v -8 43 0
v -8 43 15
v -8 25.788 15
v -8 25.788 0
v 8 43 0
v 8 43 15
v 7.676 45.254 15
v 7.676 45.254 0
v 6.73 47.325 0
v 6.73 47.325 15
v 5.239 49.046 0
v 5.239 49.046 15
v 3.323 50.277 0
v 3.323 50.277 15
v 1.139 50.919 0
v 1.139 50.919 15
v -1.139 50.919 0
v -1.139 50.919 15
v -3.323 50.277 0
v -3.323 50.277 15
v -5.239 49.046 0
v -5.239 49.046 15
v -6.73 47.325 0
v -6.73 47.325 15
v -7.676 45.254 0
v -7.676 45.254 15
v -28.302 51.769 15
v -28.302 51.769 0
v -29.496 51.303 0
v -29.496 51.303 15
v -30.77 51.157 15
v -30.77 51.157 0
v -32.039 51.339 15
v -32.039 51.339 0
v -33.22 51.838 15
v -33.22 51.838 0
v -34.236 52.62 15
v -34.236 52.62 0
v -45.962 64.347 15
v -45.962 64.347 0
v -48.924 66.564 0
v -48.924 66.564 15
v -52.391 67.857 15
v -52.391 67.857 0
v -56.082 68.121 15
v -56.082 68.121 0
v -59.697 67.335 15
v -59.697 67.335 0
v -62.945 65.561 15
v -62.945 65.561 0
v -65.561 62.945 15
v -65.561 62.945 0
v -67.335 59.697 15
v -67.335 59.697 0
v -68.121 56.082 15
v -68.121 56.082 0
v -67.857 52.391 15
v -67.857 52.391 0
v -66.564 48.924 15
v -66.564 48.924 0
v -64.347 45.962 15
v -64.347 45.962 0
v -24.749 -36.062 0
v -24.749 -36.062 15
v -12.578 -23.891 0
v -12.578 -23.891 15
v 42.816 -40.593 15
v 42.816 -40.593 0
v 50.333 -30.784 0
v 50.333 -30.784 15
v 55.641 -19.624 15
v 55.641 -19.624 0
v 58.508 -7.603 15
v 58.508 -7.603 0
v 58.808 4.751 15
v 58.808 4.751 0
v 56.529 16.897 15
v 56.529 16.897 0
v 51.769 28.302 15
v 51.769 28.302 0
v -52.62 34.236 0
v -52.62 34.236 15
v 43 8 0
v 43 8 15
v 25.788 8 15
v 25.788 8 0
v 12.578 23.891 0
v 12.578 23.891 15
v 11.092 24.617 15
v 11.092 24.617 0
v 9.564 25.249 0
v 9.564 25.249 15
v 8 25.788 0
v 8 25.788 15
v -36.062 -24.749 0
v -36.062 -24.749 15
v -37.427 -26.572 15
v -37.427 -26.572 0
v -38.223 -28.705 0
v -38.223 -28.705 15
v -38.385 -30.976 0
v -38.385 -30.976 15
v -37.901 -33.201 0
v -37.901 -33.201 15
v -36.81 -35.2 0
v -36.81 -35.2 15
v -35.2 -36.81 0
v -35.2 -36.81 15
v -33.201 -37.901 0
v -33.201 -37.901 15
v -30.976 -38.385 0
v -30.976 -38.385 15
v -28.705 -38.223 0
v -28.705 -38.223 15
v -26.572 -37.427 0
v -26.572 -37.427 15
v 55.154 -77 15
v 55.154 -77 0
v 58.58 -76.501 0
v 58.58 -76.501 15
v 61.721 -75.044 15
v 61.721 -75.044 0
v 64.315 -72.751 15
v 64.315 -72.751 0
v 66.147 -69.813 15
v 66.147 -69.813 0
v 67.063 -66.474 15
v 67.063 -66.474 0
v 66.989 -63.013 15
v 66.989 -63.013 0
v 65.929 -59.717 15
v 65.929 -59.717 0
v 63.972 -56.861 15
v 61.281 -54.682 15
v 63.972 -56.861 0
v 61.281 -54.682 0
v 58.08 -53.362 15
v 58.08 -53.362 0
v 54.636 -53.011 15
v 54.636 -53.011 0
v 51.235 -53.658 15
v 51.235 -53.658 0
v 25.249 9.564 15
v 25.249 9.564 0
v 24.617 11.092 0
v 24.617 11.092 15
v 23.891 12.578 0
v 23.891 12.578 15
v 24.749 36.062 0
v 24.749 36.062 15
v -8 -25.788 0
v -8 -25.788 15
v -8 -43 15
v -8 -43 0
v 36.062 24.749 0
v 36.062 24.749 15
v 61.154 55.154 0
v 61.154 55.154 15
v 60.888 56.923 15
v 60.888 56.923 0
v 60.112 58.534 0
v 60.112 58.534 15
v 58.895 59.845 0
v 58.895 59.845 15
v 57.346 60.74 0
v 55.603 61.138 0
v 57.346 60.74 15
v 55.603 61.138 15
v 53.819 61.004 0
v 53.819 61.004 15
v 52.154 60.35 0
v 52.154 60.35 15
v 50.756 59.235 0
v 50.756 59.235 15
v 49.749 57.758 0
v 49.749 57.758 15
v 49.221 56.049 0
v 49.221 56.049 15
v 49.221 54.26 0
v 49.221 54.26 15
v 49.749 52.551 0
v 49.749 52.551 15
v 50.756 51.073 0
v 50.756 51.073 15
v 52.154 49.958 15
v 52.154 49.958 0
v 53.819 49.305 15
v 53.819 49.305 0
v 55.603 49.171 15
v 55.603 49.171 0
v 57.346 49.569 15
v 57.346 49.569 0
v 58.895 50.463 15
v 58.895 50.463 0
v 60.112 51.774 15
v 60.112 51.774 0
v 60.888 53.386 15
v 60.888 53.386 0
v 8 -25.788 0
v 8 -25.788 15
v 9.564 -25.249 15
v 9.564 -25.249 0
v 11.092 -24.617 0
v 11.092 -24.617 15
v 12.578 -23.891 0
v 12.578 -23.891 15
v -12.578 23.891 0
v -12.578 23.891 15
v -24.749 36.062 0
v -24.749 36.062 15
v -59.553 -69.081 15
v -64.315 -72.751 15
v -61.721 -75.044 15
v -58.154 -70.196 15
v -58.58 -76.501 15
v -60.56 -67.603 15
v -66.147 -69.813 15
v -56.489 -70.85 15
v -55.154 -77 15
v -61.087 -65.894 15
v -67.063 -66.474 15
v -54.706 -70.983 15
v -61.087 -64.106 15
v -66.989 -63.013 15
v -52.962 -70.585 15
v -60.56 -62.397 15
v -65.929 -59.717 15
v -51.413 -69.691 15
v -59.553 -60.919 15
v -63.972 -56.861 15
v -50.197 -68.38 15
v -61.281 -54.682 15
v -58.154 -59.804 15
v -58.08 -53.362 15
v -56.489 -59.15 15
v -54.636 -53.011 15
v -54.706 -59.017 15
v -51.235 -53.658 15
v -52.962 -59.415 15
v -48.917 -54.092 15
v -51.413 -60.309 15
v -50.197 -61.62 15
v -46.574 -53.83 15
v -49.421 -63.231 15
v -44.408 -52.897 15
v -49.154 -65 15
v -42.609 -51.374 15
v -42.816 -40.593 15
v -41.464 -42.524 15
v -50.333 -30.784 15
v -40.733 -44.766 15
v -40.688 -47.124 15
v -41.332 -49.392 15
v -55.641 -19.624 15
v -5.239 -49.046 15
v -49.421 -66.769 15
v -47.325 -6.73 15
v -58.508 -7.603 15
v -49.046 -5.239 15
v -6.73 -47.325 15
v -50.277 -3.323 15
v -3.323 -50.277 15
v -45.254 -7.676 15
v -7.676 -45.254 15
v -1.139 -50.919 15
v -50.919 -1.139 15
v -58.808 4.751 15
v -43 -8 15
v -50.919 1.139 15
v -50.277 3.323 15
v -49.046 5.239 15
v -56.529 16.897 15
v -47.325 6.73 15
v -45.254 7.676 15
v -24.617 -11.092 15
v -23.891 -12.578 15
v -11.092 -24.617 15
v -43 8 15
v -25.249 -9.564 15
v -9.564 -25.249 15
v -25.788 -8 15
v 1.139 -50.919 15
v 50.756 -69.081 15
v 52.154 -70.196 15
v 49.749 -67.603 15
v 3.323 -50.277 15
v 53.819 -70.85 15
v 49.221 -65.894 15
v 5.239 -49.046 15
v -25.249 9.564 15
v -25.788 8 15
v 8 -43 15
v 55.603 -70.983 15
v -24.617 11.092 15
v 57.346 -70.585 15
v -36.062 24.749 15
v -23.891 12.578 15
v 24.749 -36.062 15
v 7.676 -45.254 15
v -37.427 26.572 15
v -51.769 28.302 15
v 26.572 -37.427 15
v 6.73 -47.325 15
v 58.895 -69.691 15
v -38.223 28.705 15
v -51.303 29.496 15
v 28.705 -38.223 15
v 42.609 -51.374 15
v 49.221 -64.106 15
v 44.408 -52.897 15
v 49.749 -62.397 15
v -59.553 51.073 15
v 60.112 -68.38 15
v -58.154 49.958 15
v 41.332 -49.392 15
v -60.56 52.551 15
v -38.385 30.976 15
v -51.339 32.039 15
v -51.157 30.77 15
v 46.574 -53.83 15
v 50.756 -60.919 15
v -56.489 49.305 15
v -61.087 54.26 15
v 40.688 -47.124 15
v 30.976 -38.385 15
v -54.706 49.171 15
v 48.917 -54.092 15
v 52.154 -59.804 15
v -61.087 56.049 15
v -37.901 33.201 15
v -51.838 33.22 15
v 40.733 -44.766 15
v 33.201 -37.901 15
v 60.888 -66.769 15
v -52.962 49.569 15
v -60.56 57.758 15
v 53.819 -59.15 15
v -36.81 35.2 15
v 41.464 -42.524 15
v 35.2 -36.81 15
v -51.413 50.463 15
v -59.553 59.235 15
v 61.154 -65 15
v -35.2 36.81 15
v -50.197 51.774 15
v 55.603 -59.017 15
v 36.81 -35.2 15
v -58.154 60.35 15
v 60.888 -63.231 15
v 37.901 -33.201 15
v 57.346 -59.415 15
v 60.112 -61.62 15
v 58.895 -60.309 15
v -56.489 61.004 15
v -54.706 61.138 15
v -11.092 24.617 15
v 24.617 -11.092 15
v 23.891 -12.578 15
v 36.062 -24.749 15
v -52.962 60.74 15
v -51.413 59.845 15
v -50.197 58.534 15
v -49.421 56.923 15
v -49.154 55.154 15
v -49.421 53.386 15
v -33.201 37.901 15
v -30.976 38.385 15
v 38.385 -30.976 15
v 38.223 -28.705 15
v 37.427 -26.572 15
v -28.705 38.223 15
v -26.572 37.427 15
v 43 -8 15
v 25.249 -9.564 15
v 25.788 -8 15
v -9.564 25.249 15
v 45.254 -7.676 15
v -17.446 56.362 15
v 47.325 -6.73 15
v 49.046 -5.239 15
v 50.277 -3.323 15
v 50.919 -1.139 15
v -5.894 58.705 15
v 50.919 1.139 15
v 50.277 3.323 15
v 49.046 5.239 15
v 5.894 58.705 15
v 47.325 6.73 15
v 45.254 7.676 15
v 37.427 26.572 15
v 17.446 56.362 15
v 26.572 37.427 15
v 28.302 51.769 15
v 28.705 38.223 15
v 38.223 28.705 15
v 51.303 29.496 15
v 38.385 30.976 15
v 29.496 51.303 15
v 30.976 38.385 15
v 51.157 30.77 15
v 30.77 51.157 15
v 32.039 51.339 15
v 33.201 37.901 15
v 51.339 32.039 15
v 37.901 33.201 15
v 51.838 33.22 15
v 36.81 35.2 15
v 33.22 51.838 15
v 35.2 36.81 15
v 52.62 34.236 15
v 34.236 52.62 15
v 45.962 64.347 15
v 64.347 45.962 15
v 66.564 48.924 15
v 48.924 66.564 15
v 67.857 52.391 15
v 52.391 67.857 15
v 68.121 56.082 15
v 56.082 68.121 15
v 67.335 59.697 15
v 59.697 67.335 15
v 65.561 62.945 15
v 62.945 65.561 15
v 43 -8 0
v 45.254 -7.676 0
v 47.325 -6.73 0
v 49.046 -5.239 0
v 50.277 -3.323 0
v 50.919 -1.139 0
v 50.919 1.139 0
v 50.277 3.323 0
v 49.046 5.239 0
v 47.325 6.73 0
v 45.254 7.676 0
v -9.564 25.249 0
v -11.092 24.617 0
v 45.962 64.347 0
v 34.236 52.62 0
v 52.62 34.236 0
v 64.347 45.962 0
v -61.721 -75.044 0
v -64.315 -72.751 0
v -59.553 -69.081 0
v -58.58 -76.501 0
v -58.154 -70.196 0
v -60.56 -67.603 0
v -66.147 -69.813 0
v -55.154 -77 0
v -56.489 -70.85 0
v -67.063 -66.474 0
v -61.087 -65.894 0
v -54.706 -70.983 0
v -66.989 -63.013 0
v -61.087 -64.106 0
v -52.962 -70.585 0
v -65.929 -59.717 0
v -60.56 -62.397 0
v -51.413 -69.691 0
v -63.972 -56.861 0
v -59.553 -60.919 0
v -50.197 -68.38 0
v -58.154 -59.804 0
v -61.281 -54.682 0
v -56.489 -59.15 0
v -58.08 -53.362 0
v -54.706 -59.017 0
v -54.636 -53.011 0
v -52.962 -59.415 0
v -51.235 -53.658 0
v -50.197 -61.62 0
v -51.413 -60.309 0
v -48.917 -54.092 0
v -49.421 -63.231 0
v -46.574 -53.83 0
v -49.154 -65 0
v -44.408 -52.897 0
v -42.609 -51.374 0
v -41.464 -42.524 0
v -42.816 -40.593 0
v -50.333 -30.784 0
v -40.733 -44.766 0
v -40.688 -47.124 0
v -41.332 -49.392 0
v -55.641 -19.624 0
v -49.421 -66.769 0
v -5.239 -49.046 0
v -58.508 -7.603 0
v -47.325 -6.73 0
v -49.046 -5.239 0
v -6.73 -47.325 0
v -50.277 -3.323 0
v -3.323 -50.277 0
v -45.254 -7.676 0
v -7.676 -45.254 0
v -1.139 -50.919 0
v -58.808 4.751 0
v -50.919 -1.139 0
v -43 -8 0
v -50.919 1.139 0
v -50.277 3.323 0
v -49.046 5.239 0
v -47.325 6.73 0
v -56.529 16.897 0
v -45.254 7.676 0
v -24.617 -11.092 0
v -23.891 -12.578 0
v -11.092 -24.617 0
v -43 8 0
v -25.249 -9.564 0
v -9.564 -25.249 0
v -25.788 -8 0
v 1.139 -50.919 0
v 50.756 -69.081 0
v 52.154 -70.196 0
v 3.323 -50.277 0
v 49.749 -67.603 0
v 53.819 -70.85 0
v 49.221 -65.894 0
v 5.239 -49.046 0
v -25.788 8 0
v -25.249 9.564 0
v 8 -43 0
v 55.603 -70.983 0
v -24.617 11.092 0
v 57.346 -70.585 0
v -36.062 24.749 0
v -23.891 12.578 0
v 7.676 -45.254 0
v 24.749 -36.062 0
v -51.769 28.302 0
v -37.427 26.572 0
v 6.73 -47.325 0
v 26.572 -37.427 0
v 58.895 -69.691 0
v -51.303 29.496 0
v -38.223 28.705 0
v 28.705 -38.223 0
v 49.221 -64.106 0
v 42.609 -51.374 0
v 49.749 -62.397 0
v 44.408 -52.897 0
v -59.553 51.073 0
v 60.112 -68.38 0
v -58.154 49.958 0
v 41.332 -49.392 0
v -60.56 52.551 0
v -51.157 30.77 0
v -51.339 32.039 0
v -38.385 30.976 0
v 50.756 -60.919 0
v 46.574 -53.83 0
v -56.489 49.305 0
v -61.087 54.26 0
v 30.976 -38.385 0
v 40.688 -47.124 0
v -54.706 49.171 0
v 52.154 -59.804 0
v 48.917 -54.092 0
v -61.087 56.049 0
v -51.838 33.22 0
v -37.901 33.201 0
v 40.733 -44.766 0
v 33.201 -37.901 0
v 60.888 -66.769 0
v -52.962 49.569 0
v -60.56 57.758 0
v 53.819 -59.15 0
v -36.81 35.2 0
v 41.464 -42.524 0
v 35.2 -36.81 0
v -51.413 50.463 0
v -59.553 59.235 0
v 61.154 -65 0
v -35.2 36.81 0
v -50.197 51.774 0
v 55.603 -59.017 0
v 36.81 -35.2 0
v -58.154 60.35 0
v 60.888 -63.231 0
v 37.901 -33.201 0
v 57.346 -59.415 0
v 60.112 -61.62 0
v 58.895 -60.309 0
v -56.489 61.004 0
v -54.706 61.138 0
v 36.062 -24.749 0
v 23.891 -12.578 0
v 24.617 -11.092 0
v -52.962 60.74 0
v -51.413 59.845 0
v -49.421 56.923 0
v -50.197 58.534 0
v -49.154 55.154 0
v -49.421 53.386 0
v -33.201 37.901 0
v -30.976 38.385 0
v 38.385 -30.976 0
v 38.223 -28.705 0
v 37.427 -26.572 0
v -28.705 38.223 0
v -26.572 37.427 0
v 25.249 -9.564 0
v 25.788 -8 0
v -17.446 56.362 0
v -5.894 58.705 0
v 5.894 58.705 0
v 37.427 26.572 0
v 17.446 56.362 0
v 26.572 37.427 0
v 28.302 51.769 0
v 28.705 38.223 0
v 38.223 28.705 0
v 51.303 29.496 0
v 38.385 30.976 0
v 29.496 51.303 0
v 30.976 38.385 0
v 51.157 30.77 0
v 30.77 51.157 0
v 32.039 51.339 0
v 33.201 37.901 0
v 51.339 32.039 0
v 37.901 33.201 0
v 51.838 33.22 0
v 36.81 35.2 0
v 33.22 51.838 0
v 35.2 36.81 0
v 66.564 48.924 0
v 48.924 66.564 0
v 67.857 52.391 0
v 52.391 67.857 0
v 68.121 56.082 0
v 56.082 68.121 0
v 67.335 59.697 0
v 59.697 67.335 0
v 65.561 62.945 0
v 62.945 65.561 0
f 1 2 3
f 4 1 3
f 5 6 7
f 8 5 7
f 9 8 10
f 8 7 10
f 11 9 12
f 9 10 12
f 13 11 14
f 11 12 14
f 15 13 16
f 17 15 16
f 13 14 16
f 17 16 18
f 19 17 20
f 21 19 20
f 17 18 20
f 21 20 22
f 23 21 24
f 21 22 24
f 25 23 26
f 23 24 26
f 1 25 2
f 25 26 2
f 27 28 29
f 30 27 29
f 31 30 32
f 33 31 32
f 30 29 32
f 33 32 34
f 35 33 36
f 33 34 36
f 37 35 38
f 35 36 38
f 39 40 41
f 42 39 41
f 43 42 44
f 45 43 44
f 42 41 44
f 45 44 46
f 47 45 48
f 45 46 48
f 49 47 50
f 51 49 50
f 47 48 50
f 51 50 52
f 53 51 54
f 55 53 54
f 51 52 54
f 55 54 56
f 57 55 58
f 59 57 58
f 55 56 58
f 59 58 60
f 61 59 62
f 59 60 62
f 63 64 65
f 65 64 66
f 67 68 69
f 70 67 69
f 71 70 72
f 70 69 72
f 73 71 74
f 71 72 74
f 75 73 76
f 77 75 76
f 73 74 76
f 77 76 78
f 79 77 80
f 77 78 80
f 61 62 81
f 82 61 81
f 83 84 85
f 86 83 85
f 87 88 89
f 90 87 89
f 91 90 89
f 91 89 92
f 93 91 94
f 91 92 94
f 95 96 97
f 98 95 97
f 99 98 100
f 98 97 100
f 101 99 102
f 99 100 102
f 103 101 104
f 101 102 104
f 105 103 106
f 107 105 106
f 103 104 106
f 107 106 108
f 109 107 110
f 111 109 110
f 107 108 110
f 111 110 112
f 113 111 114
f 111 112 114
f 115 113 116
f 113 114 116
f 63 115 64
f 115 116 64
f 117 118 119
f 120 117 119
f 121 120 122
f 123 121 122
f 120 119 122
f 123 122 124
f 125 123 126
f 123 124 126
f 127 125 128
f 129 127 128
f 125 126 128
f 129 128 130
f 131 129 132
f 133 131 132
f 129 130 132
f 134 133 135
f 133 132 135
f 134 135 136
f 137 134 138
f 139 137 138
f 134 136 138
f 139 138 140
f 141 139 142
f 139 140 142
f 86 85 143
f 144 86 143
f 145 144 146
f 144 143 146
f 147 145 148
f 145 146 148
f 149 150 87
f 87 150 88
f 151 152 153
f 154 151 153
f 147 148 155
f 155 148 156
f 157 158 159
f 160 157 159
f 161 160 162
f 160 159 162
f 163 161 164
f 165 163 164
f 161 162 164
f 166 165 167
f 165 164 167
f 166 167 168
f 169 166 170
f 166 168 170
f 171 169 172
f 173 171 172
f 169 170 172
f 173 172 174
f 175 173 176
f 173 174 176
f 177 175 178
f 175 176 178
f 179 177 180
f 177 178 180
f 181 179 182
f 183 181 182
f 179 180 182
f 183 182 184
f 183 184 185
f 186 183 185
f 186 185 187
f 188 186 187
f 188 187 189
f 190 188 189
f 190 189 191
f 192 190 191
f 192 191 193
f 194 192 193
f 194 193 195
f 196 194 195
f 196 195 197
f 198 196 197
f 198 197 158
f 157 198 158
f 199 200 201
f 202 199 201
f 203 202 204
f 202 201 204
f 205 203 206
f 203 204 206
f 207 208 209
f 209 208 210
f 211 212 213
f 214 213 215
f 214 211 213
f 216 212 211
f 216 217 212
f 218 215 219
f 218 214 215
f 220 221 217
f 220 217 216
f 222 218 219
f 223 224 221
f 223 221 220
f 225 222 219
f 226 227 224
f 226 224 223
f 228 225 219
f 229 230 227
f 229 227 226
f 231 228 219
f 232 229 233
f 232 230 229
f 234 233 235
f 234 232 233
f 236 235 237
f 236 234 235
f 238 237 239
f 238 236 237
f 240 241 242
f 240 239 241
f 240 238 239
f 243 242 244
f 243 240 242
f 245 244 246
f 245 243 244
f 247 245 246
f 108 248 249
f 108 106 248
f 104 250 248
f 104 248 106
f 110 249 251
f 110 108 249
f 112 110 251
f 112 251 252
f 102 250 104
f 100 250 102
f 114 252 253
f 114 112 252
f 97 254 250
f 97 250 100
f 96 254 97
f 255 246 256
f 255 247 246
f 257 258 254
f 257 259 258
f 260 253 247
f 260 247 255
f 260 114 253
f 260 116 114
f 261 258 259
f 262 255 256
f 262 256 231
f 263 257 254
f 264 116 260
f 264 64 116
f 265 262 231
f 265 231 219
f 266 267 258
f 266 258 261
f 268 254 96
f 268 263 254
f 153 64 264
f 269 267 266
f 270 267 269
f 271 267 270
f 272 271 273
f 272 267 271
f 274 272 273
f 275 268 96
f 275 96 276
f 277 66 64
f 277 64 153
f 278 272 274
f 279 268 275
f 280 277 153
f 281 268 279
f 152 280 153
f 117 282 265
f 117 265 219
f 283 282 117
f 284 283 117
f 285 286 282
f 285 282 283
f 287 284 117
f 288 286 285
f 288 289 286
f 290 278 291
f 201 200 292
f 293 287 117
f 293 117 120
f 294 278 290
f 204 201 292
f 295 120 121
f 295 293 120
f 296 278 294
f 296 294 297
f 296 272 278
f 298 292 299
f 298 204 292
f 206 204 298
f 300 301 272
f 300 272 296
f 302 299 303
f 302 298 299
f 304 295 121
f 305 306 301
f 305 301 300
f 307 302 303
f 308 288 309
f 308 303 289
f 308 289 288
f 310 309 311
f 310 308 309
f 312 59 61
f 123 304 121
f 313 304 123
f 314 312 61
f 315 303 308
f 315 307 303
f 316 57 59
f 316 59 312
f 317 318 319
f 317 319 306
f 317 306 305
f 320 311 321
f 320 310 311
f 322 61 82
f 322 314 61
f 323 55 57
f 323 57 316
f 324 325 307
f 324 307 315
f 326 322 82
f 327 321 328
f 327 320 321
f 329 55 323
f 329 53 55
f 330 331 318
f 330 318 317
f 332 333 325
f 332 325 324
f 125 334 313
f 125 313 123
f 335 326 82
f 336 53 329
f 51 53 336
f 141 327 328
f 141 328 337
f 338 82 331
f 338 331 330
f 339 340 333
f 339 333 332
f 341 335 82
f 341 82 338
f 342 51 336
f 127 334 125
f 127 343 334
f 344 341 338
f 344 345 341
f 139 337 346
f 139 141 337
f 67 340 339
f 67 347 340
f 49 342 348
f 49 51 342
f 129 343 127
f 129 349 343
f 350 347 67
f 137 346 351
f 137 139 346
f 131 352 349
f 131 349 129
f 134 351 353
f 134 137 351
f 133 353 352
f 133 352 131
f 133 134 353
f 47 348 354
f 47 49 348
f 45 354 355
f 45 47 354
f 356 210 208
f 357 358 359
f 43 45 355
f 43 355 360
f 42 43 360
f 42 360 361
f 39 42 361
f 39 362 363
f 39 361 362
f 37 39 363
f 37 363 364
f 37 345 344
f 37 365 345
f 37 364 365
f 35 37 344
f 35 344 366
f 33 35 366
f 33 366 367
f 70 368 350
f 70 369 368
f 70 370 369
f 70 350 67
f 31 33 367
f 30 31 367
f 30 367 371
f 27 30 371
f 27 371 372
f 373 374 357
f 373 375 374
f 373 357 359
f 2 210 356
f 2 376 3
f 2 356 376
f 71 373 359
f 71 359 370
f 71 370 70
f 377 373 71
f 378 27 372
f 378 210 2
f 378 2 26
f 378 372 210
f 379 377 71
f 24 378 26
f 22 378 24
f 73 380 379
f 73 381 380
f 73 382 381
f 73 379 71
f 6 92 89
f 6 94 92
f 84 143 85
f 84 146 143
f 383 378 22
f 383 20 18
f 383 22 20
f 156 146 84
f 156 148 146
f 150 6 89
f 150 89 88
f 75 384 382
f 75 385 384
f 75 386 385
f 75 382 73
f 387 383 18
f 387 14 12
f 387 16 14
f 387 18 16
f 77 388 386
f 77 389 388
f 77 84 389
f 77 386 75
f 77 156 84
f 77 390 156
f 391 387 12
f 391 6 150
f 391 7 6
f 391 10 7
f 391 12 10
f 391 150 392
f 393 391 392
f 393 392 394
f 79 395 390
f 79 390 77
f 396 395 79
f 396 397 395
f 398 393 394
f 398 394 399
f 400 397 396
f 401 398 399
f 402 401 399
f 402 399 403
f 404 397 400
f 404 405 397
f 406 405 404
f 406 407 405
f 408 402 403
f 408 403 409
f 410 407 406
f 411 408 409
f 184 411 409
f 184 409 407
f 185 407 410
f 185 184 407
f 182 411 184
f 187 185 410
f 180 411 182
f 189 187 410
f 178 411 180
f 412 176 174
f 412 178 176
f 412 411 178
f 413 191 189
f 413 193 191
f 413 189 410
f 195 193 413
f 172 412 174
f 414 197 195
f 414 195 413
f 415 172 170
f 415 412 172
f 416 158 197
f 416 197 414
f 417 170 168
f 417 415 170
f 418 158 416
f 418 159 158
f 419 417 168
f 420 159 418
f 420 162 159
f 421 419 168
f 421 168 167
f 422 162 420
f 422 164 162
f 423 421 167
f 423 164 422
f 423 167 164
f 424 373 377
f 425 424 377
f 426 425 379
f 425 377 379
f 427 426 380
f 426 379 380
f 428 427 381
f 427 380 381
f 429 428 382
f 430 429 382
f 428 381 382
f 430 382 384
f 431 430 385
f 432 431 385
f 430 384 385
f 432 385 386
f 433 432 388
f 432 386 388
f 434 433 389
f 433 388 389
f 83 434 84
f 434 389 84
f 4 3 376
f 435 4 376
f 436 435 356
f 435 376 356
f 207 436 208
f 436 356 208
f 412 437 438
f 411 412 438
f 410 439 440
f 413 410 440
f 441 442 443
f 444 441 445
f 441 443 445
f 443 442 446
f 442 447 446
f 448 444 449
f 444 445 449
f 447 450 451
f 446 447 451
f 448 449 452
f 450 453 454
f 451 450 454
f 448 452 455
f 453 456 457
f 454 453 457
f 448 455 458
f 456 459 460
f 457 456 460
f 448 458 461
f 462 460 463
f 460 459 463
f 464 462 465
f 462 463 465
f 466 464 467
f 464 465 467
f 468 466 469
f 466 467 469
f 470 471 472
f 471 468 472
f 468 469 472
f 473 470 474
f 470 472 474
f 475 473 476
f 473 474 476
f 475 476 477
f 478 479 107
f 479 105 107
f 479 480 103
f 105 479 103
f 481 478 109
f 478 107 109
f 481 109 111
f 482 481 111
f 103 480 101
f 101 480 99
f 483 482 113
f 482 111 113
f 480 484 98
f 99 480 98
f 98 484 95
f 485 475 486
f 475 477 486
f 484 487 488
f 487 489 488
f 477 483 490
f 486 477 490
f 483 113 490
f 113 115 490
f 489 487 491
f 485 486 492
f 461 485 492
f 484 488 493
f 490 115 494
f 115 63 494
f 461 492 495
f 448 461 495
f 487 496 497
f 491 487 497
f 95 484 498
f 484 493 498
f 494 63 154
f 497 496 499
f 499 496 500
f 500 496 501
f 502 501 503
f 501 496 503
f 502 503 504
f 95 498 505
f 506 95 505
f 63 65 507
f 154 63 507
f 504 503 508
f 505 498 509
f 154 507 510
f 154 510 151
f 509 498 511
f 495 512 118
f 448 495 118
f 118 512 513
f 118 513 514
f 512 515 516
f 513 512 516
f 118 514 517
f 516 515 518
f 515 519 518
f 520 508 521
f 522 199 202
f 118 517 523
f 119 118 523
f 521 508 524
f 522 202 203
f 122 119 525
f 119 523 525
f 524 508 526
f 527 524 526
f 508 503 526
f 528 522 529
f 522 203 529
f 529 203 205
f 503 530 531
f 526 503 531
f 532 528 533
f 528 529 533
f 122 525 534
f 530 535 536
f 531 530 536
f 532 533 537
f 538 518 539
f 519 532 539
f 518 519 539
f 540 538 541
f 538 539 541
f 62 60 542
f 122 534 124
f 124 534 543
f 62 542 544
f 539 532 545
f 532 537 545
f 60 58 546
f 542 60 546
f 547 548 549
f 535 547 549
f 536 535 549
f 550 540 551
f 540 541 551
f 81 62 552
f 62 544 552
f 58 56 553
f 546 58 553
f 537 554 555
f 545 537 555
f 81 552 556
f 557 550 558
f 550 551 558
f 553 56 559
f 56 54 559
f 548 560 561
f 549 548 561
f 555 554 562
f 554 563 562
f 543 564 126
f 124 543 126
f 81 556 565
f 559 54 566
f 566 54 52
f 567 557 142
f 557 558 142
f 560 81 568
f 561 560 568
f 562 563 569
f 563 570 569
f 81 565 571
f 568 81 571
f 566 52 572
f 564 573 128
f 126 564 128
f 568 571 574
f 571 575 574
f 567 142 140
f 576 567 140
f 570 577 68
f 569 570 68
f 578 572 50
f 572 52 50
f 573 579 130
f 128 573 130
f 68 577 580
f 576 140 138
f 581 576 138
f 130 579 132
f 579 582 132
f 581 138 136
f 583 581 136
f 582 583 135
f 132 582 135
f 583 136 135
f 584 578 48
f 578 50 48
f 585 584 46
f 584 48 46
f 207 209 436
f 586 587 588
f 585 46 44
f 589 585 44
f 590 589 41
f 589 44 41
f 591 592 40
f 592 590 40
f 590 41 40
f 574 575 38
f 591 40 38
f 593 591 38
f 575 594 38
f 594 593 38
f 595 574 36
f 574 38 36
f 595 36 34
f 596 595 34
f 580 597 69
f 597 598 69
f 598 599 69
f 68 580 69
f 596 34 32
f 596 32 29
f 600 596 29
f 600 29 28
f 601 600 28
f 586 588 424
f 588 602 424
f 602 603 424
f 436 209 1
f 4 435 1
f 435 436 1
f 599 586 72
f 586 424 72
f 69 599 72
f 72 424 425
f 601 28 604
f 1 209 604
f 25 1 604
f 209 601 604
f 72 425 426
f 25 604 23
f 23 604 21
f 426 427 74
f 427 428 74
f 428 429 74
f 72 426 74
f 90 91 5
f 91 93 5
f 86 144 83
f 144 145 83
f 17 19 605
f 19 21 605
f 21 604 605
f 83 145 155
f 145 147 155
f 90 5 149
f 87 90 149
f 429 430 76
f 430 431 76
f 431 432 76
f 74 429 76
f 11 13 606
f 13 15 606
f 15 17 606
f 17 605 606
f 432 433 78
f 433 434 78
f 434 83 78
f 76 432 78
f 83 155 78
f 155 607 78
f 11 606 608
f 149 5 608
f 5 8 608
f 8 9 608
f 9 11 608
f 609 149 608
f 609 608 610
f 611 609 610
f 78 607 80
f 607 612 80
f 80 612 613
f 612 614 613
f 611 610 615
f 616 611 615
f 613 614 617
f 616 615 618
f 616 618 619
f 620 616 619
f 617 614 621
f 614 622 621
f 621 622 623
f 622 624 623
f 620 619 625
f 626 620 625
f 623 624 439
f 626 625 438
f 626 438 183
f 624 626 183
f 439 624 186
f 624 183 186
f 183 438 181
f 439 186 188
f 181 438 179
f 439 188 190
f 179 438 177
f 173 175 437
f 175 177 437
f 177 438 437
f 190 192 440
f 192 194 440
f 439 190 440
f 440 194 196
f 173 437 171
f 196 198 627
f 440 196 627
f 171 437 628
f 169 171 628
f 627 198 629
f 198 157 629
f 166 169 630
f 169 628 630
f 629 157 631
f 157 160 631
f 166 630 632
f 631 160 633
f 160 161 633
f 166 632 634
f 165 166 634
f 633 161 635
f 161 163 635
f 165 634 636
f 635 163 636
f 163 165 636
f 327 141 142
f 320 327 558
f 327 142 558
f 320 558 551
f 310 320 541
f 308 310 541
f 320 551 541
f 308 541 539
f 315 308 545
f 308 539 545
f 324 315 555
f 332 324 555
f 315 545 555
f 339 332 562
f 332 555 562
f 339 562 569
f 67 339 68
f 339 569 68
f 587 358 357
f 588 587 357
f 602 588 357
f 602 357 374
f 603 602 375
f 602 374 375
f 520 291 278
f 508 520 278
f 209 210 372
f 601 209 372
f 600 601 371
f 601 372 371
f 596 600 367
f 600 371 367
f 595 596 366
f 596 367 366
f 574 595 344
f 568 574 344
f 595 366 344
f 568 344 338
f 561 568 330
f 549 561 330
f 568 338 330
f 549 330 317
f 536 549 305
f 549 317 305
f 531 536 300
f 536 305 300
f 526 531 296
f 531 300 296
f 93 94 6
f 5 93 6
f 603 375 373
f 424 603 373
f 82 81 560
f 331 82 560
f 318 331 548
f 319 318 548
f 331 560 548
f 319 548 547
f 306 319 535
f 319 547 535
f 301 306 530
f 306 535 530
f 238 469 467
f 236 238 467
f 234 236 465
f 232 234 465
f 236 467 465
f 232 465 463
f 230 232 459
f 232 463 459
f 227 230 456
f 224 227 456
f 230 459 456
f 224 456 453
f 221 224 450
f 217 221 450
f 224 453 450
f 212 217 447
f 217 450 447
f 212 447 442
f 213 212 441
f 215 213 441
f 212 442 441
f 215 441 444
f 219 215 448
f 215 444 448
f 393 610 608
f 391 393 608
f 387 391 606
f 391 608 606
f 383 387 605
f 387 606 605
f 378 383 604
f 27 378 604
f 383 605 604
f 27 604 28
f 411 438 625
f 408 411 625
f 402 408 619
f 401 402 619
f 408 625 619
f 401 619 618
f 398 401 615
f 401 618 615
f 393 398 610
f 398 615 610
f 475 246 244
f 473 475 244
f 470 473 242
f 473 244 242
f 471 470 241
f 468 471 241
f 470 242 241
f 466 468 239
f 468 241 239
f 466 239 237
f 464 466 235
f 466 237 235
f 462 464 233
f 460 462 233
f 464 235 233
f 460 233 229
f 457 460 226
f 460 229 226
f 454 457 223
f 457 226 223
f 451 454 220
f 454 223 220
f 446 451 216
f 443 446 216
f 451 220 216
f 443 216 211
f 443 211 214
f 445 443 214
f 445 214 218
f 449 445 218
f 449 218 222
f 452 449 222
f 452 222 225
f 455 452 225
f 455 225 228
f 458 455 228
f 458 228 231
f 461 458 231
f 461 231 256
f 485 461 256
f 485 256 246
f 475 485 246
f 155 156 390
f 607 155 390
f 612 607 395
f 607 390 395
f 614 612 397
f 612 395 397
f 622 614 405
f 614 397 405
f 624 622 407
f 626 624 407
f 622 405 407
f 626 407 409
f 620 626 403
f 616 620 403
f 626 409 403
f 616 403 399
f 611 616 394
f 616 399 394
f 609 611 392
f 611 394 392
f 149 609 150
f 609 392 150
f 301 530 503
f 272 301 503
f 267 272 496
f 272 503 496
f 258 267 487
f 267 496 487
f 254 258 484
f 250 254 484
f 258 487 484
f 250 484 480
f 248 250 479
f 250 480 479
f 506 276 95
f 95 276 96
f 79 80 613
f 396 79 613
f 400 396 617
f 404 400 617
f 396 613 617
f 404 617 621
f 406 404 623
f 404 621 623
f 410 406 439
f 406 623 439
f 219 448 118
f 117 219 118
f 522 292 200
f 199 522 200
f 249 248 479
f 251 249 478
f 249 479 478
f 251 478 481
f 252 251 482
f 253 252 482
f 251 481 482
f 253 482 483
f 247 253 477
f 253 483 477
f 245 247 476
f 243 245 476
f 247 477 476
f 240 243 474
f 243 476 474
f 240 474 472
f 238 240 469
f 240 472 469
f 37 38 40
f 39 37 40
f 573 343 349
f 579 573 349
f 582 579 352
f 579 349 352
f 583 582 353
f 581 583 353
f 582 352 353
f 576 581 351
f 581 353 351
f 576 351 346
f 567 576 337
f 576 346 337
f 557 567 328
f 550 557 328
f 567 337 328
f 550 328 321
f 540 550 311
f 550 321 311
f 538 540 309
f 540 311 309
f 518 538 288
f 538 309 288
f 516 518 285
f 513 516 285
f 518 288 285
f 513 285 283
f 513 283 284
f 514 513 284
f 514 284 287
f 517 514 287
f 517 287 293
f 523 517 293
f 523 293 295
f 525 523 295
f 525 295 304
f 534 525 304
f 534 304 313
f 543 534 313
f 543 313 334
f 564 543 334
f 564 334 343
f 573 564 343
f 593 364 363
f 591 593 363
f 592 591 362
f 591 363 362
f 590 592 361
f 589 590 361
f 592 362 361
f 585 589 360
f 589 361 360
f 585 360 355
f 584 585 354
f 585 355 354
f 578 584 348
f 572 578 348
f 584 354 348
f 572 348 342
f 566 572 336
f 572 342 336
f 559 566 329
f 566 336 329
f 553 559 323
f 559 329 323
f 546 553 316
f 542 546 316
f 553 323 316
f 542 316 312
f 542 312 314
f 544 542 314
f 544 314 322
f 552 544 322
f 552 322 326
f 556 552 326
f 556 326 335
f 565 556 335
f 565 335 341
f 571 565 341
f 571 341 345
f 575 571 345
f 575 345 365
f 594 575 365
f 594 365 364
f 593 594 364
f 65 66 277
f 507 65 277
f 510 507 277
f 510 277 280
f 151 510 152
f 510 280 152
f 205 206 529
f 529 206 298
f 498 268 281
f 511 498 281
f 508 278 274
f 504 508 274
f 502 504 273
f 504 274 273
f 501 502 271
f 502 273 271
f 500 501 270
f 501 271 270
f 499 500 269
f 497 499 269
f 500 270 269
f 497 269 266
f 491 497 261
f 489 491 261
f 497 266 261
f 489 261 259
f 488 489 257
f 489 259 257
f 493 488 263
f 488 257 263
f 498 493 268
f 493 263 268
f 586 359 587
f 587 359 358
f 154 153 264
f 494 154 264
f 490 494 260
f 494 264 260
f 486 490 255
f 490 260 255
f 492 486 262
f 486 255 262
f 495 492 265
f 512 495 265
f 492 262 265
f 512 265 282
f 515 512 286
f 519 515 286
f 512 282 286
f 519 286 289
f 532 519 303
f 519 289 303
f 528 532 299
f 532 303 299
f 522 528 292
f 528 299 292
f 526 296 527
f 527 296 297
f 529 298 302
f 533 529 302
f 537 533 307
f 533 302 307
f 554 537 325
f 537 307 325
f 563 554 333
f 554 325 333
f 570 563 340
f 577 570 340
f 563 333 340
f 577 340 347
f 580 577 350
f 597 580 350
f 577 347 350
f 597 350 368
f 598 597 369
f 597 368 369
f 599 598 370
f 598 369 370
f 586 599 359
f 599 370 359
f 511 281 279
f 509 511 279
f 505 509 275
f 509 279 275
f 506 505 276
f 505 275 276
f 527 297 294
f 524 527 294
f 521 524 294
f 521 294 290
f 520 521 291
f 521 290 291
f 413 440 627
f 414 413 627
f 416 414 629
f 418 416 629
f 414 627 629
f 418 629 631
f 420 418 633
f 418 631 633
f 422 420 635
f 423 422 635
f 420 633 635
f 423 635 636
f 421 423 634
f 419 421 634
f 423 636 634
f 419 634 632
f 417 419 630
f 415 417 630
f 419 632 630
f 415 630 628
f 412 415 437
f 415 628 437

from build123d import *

# Parameters (mm, degrees)
SALIENTE_EXTRUIR1_DEPTH = 15
CROQUIS2_R              = 6
CORTAR_EXTRUIR1_DEPTH   = 104.918297485


with BuildPart() as part:
    # Croquis1 → Saliente-Extruir1 (new body)
    with BuildSketch(Plane.XY):
        with BuildLine():
            Line((-64.346717088, 45.961940777), (-52.620489657, 34.235713346))
            ThreePointArc((-52.620489657, 34.235713346), (-51.206737587, 31.410509176), (-51.768834222, 28.301727921))
            ThreePointArc((-51.768834222, 28.301727921), (-58.508070764, -7.603003058), (-42.816126208, -40.592848343))
            ThreePointArc((-42.816126208, -40.592848343), (-41.896840908, -50.430118648), (-51.234753159, -53.658178023))
            ThreePointArc((-51.234753159, -53.658178023), (-66.988640567, -63.012773757), (-55.154328933, -77))
            Line((-55.154328933, -77), (55.154328933, -77))
            ThreePointArc((55.154328933, -77), (66.988640567, -63.012773757), (51.234753159, -53.658178023))
            ThreePointArc((51.234753159, -53.658178023), (41.896840908, -50.430118648), (42.816126208, -40.592848343))
            ThreePointArc((42.816126208, -40.592848343), (58.508070764, -7.603003058), (51.768834222, 28.301727921))
            ThreePointArc((51.768834222, 28.301727921), (51.206737587, 31.410509176), (52.620489657, 34.235713346))
            Line((52.620489657, 34.235713346), (64.346717088, 45.961940777))
            ThreePointArc((64.346717088, 45.961940777), (64.346717088, 64.346717088), (45.961940777, 64.346717088))
            Line((45.961940777, 64.346717088), (34.235713346, 52.620489657))
            ThreePointArc((34.235713346, 52.620489657), (31.410509176, 51.206737587), (28.301727921, 51.768834222))
            ThreePointArc((28.301727921, 51.768834222), (0, 59), (-28.301727921, 51.768834222))
            ThreePointArc((-28.301727921, 51.768834222), (-31.410509176, 51.206737587), (-34.235713346, 52.620489657))
            Line((-34.235713346, 52.620489657), (-45.961940777, 64.346717088))
            ThreePointArc((-45.961940777, 64.346717088), (-64.346717088, 64.346717088), (-64.346717088, 45.961940777))
        make_face()
    extrude(amount=SALIENTE_EXTRUIR1_DEPTH)

    # Croquis2 → Cortar-Extruir1 (cut, through all)
    with BuildSketch(Plane.XY.offset(15)):
        with Locations((-55.154328933, 55.154328933)):
            Circle(CROQUIS2_R)
        with Locations((55.154328933, 55.154328933)):
            Circle(CROQUIS2_R)
        with Locations((-55.154328933, -65)):
            Circle(CROQUIS2_R)
        with Locations((55.154328933, -65)):
            Circle(CROQUIS2_R)
        with BuildLine():
            Line((-8, 43), (-8, 25.787593916))
            ThreePointArc((-8, 25.787593916), (-10.332452674, 24.944747378), (-12.577728279, 23.891436778))
            Line((-12.577728279, 23.891436778), (-24.748737342, 36.062445841))
            ThreePointArc((-24.748737342, 36.062445841), (-36.062445841, 36.062445841), (-36.062445841, 24.748737342))
            Line((-36.062445841, 24.748737342), (-23.891436778, 12.577728279))
            ThreePointArc((-23.891436778, 12.577728279), (-24.944747378, 10.332452674), (-25.787593916, 8))
            Line((-25.787593916, 8), (-43, 8))
            ThreePointArc((-43, 8), (-51, 0), (-43, -8))
            Line((-43, -8), (-25.787593916, -8))
            ThreePointArc((-25.787593916, -8), (-24.944747378, -10.332452674), (-23.891436778, -12.577728279))
            Line((-23.891436778, -12.577728279), (-36.062445841, -24.748737342))
            ThreePointArc((-36.062445841, -24.748737342), (-36.062445841, -36.062445841), (-24.748737342, -36.062445841))
            Line((-24.748737342, -36.062445841), (-12.577728279, -23.891436778))
            ThreePointArc((-12.577728279, -23.891436778), (-10.332452674, -24.944747378), (-8, -25.787593916))
            Line((-8, -25.787593916), (-8, -43))
            ThreePointArc((-8, -43), (0, -51), (8, -43))
            Line((8, -43), (8, -25.787593916))
            ThreePointArc((8, -25.787593916), (10.332452674, -24.944747378), (12.577728279, -23.891436778))
            Line((12.577728279, -23.891436778), (24.748737342, -36.062445841))
            ThreePointArc((24.748737342, -36.062445841), (36.062445841, -36.062445841), (36.062445841, -24.748737342))
            Line((36.062445841, -24.748737342), (23.891436778, -12.577728279))
            ThreePointArc((23.891436778, -12.577728279), (24.944747378, -10.332452674), (25.787593916, -8))
            Line((25.787593916, -8), (43, -8))
            ThreePointArc((43, -8), (51, 0), (43, 8))
            Line((43, 8), (25.787593916, 8))
            ThreePointArc((25.787593916, 8), (24.944747378, 10.332452674), (23.891436778, 12.577728279))
            Line((23.891436778, 12.577728279), (36.062445841, 24.748737342))
            ThreePointArc((36.062445841, 24.748737342), (36.062445841, 36.062445841), (24.748737342, 36.062445841))
            Line((24.748737342, 36.062445841), (12.577728279, 23.891436778))
            ThreePointArc((12.577728279, 23.891436778), (10.332452674, 24.944747378), (8, 25.787593916))
            Line((8, 25.787593916), (8, 43))
            ThreePointArc((8, 43), (0, 51), (-8, 43))
        make_face()
    extrude(amount=-CORTAR_EXTRUIR1_DEPTH, mode=Mode.SUBTRACT)


solid = part.part
